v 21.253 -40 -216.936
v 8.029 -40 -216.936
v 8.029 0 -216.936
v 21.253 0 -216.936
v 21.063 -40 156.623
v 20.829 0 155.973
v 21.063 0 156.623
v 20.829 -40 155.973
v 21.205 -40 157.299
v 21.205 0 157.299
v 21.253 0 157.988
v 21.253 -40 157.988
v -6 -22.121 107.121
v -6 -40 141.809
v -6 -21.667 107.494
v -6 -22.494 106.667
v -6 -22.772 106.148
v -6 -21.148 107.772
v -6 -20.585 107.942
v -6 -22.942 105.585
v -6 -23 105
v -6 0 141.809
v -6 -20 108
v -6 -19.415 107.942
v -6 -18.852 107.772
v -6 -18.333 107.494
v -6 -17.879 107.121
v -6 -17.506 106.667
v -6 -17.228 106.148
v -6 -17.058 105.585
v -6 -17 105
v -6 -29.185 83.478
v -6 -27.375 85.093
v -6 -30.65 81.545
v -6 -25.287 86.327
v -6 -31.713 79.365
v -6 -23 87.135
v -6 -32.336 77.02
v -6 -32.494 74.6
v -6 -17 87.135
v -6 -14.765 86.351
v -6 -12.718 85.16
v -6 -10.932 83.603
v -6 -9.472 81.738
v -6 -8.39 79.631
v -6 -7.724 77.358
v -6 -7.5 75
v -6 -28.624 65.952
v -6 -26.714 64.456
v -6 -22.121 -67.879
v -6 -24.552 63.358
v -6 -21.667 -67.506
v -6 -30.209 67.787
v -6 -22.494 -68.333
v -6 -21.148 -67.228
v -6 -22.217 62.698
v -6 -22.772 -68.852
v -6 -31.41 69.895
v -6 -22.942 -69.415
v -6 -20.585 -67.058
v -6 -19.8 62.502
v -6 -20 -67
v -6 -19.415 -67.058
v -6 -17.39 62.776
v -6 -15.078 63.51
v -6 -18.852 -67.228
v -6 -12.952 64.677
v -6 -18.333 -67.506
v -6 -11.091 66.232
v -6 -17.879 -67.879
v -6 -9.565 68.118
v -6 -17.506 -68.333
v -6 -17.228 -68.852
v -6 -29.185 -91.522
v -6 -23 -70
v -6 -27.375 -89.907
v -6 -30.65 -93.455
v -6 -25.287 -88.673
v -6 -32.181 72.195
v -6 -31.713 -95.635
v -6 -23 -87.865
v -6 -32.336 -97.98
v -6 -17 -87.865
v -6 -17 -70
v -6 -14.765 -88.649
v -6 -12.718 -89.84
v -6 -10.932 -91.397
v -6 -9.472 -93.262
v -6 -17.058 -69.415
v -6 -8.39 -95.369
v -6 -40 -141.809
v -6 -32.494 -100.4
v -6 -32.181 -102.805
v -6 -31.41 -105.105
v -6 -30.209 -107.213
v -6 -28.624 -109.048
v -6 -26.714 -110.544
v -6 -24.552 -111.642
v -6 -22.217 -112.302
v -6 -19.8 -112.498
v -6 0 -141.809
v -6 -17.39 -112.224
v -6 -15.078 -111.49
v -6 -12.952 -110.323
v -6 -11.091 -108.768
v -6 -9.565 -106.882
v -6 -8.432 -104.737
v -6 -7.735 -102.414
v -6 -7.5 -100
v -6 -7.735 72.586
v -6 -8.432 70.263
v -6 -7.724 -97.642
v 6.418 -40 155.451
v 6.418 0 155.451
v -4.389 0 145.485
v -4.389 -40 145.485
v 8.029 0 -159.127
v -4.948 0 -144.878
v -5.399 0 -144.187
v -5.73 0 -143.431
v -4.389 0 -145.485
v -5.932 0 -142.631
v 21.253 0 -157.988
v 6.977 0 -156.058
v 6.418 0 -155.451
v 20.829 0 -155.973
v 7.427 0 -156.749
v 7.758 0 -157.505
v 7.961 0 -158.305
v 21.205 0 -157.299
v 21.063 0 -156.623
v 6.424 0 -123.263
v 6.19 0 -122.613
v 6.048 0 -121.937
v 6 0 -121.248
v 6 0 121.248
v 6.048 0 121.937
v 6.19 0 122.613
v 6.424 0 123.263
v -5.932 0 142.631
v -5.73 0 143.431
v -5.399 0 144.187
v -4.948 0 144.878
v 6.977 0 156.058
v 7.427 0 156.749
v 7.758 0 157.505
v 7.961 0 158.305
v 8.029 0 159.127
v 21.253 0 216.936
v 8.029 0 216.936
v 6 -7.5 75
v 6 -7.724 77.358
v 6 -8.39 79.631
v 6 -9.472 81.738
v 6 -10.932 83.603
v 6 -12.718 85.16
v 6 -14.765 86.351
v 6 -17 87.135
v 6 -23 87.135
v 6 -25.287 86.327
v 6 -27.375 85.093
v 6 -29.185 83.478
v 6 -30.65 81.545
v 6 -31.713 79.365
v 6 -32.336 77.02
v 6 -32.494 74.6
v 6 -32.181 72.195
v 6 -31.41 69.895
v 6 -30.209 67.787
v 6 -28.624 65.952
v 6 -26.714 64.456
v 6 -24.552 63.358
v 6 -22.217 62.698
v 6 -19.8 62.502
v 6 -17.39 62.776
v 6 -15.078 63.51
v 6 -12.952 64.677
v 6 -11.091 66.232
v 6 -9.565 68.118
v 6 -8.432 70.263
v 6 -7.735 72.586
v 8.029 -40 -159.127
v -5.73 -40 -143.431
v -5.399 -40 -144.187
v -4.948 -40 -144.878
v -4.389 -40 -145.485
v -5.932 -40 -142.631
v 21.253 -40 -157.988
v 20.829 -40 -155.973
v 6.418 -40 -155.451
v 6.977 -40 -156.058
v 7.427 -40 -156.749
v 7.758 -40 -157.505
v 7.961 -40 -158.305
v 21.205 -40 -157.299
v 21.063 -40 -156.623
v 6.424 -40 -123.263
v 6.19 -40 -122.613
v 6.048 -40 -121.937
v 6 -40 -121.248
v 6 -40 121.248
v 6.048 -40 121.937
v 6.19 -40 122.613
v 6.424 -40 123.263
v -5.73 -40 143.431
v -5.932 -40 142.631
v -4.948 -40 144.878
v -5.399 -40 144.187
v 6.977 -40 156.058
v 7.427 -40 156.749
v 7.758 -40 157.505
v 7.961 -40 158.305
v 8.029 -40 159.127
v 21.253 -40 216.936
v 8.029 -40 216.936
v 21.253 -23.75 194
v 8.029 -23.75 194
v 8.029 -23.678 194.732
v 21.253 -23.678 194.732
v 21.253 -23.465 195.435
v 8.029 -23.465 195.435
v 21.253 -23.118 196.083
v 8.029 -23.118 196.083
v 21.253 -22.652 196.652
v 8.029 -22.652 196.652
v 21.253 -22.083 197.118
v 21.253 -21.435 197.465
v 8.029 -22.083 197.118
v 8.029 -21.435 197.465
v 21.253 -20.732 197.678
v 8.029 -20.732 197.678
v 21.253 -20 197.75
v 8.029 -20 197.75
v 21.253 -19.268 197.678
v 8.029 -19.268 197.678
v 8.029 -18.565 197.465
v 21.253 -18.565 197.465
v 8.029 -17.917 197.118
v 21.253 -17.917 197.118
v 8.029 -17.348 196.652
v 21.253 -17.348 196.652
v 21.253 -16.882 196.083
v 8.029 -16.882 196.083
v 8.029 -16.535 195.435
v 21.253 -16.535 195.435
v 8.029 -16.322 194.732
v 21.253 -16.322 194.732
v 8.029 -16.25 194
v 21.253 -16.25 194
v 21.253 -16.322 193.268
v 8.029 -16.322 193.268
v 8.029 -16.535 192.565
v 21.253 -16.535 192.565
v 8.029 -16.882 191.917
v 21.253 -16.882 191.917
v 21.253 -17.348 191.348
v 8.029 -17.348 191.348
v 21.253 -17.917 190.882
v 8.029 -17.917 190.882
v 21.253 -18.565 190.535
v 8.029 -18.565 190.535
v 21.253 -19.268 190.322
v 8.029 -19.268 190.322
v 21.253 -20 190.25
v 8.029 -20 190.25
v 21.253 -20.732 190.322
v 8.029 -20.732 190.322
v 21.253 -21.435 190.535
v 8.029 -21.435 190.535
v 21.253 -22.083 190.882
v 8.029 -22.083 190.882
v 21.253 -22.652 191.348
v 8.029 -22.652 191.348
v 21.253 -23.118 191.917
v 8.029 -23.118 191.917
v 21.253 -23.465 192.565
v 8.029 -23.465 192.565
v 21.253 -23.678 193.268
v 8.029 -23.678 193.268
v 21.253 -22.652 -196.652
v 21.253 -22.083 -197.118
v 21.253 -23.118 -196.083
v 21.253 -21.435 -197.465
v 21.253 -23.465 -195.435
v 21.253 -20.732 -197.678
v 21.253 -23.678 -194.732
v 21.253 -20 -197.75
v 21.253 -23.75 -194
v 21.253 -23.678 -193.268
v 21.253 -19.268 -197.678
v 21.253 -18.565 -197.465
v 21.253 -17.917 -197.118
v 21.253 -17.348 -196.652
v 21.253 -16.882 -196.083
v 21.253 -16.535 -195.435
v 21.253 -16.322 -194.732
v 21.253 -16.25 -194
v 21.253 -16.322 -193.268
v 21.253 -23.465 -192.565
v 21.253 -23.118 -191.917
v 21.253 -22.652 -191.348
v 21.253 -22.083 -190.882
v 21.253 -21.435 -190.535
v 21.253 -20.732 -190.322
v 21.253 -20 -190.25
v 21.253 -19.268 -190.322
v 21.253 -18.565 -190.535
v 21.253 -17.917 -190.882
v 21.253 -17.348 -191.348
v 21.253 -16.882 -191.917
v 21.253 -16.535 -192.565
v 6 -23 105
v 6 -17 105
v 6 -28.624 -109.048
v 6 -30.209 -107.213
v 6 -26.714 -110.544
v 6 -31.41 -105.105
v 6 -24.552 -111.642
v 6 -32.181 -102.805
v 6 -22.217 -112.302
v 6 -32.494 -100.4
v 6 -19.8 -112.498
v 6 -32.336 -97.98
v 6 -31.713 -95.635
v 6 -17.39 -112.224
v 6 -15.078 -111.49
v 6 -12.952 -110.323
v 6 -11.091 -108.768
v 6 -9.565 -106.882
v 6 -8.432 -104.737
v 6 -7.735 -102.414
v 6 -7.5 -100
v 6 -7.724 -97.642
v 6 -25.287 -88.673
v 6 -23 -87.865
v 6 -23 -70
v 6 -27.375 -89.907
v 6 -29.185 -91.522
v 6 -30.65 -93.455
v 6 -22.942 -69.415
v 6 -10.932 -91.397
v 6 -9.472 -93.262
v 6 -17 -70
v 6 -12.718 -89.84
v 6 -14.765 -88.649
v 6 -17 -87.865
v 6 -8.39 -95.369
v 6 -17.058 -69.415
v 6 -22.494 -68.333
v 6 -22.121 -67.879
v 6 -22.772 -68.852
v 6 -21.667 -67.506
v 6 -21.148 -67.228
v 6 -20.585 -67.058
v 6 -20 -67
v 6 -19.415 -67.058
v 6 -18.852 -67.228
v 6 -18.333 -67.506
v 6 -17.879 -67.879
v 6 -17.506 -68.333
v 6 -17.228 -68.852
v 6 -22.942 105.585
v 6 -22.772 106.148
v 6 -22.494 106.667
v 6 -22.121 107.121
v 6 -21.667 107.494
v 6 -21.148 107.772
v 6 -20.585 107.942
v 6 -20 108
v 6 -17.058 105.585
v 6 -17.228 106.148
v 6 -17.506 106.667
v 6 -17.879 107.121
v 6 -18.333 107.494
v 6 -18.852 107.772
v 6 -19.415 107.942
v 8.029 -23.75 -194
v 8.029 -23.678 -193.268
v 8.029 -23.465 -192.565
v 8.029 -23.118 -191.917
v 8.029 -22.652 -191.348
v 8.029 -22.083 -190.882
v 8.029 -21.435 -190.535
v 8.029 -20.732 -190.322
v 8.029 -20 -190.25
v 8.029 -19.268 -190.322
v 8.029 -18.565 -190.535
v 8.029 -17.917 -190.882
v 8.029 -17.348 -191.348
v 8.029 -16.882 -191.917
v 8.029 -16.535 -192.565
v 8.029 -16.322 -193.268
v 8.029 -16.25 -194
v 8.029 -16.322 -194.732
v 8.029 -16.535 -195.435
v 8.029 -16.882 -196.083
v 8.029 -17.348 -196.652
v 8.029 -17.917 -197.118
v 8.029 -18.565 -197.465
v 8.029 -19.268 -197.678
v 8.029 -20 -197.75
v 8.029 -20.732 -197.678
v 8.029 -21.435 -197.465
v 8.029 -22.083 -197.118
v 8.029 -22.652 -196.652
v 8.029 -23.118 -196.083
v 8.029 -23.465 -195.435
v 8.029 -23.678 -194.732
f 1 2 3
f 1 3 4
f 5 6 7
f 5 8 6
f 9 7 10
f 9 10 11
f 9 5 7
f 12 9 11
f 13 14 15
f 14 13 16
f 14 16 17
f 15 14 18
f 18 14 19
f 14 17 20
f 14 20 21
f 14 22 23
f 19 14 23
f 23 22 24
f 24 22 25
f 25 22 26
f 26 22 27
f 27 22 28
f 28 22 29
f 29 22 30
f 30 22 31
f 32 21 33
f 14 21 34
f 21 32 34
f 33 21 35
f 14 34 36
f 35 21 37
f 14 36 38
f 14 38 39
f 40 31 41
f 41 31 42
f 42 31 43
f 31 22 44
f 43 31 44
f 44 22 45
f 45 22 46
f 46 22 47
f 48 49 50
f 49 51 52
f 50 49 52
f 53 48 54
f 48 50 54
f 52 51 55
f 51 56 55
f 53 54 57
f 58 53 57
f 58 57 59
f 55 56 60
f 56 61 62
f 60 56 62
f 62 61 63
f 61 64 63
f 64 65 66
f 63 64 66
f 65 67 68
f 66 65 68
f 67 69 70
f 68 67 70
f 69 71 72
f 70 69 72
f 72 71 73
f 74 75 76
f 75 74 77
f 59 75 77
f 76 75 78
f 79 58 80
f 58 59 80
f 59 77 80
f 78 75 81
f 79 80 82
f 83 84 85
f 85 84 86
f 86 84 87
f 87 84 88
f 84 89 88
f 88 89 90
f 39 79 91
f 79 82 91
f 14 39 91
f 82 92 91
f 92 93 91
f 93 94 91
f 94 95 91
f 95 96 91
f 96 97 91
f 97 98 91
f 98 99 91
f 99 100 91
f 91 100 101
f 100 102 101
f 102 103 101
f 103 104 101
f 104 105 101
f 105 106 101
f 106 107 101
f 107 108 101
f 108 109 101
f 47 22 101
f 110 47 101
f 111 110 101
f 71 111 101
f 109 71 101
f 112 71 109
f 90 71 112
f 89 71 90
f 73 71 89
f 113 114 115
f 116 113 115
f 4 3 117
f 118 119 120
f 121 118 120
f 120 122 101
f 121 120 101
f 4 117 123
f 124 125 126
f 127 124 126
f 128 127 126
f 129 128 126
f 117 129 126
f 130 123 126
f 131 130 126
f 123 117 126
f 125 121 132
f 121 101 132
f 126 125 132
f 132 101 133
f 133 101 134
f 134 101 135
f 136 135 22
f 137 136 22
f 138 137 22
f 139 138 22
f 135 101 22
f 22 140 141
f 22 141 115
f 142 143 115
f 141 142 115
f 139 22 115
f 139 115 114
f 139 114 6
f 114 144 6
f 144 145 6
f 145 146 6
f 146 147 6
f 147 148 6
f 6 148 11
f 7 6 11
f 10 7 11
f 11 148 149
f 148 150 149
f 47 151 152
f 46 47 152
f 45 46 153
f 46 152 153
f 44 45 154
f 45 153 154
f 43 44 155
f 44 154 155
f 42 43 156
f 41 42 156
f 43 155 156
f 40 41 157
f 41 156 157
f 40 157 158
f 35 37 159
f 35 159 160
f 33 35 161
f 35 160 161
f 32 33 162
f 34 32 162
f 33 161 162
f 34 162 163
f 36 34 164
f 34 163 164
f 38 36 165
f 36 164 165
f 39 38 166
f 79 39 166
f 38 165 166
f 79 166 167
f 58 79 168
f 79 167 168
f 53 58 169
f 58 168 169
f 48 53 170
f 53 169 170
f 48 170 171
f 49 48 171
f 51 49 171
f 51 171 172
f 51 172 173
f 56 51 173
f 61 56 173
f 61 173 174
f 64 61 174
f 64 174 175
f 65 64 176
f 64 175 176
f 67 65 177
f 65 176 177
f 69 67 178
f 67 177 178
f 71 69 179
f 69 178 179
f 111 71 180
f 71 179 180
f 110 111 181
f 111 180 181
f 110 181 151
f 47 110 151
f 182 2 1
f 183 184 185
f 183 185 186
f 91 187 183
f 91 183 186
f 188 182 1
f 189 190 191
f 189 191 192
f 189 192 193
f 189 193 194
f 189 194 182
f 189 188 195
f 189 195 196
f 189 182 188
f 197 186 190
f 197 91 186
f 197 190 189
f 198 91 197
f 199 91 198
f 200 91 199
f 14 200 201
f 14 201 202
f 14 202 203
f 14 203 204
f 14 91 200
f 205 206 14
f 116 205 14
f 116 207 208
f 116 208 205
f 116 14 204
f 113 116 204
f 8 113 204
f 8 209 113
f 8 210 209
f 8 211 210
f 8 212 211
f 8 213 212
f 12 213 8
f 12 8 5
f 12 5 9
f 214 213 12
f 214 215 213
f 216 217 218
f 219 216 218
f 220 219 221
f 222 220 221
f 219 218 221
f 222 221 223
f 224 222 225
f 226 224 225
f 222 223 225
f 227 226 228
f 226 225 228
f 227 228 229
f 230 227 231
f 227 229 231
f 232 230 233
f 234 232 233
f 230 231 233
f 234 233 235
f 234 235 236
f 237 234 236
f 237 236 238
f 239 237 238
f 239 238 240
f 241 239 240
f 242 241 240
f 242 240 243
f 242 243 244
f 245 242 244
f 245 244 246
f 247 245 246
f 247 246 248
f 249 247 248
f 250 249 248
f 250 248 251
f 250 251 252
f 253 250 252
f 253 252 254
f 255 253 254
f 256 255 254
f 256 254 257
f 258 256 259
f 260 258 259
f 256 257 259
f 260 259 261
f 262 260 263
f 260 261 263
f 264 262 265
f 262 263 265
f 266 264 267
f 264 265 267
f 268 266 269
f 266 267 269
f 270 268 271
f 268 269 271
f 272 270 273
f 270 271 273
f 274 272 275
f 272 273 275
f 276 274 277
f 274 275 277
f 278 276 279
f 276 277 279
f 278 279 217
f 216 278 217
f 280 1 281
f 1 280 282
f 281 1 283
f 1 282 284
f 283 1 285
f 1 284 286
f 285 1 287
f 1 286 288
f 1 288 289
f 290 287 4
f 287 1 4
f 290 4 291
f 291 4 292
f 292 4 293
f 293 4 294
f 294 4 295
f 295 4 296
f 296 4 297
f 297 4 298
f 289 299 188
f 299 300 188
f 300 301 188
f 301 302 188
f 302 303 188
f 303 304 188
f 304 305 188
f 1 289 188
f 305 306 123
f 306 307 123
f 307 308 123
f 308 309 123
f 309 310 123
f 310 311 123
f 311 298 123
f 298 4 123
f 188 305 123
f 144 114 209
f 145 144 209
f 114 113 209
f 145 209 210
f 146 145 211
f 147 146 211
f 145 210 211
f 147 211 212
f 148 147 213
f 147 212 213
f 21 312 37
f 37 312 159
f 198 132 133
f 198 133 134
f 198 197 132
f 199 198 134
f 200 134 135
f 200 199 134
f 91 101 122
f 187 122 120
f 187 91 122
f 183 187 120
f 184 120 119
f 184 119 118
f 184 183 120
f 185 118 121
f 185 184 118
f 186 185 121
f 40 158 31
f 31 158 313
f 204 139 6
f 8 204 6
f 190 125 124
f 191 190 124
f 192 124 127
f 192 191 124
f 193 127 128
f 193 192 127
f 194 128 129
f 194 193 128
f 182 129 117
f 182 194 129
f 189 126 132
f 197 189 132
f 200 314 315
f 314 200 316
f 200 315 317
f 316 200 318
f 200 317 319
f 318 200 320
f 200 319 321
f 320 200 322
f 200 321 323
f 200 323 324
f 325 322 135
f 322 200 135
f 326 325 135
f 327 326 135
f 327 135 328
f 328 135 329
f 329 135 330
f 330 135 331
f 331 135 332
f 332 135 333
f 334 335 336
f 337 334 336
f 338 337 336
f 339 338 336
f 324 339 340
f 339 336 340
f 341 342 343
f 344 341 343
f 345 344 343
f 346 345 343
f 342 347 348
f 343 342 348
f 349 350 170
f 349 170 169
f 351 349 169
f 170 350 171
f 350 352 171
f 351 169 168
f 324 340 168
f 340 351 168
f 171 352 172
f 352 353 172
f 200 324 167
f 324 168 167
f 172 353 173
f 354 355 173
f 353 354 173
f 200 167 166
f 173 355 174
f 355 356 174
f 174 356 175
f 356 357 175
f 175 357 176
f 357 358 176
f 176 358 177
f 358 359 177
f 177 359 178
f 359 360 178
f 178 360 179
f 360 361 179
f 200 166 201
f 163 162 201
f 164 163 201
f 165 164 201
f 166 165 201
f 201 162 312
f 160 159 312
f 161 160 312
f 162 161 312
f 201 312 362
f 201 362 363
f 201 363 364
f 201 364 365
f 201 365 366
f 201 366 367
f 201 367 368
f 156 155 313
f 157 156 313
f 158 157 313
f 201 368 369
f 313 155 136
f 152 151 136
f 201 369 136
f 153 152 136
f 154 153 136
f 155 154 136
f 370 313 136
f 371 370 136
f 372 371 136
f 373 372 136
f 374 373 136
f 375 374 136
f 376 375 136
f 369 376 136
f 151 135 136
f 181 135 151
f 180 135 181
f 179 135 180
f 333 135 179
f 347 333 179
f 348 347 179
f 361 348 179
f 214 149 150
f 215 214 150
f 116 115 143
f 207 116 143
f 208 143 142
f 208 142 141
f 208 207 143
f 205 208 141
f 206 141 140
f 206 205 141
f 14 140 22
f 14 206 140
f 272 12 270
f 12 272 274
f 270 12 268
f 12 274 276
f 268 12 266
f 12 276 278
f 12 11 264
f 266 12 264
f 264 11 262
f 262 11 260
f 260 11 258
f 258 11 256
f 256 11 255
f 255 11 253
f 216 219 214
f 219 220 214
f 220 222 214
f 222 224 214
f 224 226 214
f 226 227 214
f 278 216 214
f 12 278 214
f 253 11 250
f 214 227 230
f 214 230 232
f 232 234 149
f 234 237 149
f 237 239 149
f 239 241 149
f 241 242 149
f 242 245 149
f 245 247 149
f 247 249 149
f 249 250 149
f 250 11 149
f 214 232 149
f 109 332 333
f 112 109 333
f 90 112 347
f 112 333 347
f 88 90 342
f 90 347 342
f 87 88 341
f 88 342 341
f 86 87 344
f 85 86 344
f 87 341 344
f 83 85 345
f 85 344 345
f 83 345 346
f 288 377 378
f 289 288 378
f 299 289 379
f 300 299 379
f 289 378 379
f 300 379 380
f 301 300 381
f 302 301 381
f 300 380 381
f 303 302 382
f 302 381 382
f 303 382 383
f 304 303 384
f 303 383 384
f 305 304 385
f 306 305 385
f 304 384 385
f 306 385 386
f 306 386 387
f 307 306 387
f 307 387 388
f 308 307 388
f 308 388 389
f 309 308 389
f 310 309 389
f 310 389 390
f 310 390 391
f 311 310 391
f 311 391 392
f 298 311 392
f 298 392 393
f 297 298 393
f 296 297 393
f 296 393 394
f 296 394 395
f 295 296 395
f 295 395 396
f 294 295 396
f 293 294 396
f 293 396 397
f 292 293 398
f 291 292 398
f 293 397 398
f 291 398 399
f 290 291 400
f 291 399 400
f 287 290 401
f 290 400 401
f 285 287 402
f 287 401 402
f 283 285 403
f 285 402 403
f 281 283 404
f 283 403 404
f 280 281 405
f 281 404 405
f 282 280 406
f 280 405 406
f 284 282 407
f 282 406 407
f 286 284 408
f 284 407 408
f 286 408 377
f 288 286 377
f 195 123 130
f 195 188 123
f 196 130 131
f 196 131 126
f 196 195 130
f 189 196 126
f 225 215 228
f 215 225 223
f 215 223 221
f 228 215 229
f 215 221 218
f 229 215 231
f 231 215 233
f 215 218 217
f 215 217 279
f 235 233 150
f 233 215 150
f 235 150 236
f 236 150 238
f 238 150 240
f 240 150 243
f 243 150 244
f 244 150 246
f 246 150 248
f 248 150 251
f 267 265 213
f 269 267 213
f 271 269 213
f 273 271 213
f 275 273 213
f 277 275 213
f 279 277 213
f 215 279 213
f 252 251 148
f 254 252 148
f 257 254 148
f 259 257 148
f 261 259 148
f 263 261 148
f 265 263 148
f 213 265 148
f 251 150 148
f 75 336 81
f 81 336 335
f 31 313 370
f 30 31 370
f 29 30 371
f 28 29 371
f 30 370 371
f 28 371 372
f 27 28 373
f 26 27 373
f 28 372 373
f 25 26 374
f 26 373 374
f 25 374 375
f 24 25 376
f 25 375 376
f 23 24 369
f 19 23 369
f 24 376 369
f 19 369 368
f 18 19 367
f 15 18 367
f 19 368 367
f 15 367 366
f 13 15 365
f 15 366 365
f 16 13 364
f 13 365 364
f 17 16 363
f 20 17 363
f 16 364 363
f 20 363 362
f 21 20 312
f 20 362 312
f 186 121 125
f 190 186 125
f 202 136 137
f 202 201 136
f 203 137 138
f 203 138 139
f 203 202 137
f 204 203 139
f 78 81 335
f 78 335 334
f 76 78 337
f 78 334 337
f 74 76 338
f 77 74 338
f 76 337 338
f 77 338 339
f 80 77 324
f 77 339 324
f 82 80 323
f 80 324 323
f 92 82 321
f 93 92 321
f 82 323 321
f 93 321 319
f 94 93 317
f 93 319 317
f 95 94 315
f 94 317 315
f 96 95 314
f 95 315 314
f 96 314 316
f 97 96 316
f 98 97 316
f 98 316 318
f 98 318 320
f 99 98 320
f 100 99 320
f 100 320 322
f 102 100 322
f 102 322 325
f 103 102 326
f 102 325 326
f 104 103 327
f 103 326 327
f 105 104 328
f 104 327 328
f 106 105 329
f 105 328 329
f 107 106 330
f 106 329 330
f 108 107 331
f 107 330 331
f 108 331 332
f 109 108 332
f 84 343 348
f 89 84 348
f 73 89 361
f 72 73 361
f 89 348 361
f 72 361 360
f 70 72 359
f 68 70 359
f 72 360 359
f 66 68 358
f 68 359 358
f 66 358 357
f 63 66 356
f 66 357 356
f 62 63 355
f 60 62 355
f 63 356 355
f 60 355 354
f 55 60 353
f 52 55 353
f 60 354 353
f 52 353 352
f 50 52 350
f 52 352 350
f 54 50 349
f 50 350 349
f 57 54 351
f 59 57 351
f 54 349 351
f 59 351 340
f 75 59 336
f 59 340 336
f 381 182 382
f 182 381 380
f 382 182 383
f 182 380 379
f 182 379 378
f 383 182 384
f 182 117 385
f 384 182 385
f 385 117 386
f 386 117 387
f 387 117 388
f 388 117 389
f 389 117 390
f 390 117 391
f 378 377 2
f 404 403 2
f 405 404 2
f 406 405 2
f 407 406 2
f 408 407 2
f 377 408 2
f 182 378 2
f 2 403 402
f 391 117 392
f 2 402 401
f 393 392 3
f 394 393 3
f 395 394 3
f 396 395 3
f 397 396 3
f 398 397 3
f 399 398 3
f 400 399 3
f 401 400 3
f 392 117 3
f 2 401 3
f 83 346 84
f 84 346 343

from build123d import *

# Parameters (mm, degrees)
F1_DEPTH = 40
F2_R     = 5
F3_R     = 5
F5_D     = 7.5
F7_DEPTH = 12


with BuildPart() as f1:
    # F0 (on Front) → F1 (new body)
    with BuildSketch(Plane.XZ):
        Polygon((8.02879, 156.936201), (-6, 144), (6, 144), (21.253023, 156.936201), (21.253023, 216.936201), (8.02879, 216.936201), align=None)
        Polygon((6, 144), (-6, 144), (-6, -144), (6, -144), (6, -122.299686), (6, 122.299686), align=None)
        Polygon((21.253023, 156.936201), (6, 144), (6, 122.299686), align=None)
        Polygon((6, -144), (-6, -144), (8.02879, -156.936201), (8.02879, -216.936201), (21.253023, -216.936201), (21.253023, -156.936201), align=None)
        Polygon((6, -122.299686), (6, -144), (21.253023, -156.936201), align=None)
    extrude(amount=F1_DEPTH)

    # F2
    f2_edges = [f1.edges().sort_by_distance(p)[0] for p in [
        (6, -20, -122.299686),
        (21.253023, -20, -156.936201),
        (8.02879, -20, -156.936201),
        (-6, -20, -144),
        (-6, -20, 144),
        (6, -20, 122.299686),
        (21.253023, -20, 156.936201),
    ]]
    fillet(f2_edges, radius=F2_R)

    # F3
    f3_edges = [f1.edges().sort_by_distance(p)[0] for p in [
        (8.02879, -20, 156.936201),
    ]]
    fillet(f3_edges, radius=F3_R)

    # F5 (through all)
    with Locations(Plane.YZ.offset(21.253023)):
        with Locations((-20, 194), (-20, -194)):
            Hole(F5_D / 2)

    # F6 (on face) → F7 (cut)
    with BuildSketch(Plane.YZ.offset(6)):
        with BuildLine():
            Line((-17, -100), (-17, -87.865339))
            ThreePointArc((-17, -87.865339), (-18.488918, -87.591671), (-20, -87.5))
            ThreePointArc((-20, -87.5), (-21.511082, -87.591671), (-23, -87.865339))
            Line((-23, -87.865339), (-23, -100))
            ThreePointArc((-23, -100), (-20, -103), (-17, -100))
        make_face()
        with BuildLine():
            ThreePointArc((-23, -87.865339), (-27.705518, -109.84251), (-7.5, -100))
            ThreePointArc((-7.5, -100), (-10.15749, -92.294482), (-17, -87.865339))
            Line((-17, -87.865339), (-17, -100))
            ThreePointArc((-17, -100), (-20, -103), (-23, -100))
            Line((-23, -100), (-23, -87.865339))
        make_face()
        with BuildLine():
            ThreePointArc((-23, 87.134661), (-27.705518, 65.15749), (-7.5, 75))
            ThreePointArc((-7.5, 75), (-10.15749, 82.705518), (-17, 87.134661))
            Line((-17, 87.134661), (-17, 75))
            ThreePointArc((-17, 75), (-20, 72), (-23, 75))
            Line((-23, 75), (-23, 87.134661))
        make_face()
        with BuildLine():
            Line((-17, 75), (-17, 87.134661))
            ThreePointArc((-17, 87.134661), (-18.488918, 87.408329), (-20, 87.5))
            ThreePointArc((-20, 87.5), (-21.511082, 87.408329), (-23, 87.134661))
            Line((-23, 87.134661), (-23, 75))
            ThreePointArc((-23, 75), (-20, 72), (-17, 75))
        make_face()
        with BuildLine():
            ThreePointArc((-20, 87.5), (-18.488918, 87.408329), (-17, 87.134661))
            Line((-17, 87.134661), (-17, 105))
            ThreePointArc((-17, 105), (-20, 108), (-23, 105))
            Line((-23, 105), (-23, 87.134661))
            ThreePointArc((-23, 87.134661), (-21.511082, 87.408329), (-20, 87.5))
        make_face()
        with BuildLine():
            ThreePointArc((-20, -87.5), (-18.488918, -87.591671), (-17, -87.865339))
            Line((-17, -87.865339), (-17, -70))
            ThreePointArc((-17, -70), (-20, -67), (-23, -70))
            Line((-23, -70), (-23, -87.865339))
            ThreePointArc((-23, -87.865339), (-21.511082, -87.591671), (-20, -87.5))
        make_face()
    extrude(amount=-F7_DEPTH, mode=Mode.SUBTRACT)


solid = f1.part
